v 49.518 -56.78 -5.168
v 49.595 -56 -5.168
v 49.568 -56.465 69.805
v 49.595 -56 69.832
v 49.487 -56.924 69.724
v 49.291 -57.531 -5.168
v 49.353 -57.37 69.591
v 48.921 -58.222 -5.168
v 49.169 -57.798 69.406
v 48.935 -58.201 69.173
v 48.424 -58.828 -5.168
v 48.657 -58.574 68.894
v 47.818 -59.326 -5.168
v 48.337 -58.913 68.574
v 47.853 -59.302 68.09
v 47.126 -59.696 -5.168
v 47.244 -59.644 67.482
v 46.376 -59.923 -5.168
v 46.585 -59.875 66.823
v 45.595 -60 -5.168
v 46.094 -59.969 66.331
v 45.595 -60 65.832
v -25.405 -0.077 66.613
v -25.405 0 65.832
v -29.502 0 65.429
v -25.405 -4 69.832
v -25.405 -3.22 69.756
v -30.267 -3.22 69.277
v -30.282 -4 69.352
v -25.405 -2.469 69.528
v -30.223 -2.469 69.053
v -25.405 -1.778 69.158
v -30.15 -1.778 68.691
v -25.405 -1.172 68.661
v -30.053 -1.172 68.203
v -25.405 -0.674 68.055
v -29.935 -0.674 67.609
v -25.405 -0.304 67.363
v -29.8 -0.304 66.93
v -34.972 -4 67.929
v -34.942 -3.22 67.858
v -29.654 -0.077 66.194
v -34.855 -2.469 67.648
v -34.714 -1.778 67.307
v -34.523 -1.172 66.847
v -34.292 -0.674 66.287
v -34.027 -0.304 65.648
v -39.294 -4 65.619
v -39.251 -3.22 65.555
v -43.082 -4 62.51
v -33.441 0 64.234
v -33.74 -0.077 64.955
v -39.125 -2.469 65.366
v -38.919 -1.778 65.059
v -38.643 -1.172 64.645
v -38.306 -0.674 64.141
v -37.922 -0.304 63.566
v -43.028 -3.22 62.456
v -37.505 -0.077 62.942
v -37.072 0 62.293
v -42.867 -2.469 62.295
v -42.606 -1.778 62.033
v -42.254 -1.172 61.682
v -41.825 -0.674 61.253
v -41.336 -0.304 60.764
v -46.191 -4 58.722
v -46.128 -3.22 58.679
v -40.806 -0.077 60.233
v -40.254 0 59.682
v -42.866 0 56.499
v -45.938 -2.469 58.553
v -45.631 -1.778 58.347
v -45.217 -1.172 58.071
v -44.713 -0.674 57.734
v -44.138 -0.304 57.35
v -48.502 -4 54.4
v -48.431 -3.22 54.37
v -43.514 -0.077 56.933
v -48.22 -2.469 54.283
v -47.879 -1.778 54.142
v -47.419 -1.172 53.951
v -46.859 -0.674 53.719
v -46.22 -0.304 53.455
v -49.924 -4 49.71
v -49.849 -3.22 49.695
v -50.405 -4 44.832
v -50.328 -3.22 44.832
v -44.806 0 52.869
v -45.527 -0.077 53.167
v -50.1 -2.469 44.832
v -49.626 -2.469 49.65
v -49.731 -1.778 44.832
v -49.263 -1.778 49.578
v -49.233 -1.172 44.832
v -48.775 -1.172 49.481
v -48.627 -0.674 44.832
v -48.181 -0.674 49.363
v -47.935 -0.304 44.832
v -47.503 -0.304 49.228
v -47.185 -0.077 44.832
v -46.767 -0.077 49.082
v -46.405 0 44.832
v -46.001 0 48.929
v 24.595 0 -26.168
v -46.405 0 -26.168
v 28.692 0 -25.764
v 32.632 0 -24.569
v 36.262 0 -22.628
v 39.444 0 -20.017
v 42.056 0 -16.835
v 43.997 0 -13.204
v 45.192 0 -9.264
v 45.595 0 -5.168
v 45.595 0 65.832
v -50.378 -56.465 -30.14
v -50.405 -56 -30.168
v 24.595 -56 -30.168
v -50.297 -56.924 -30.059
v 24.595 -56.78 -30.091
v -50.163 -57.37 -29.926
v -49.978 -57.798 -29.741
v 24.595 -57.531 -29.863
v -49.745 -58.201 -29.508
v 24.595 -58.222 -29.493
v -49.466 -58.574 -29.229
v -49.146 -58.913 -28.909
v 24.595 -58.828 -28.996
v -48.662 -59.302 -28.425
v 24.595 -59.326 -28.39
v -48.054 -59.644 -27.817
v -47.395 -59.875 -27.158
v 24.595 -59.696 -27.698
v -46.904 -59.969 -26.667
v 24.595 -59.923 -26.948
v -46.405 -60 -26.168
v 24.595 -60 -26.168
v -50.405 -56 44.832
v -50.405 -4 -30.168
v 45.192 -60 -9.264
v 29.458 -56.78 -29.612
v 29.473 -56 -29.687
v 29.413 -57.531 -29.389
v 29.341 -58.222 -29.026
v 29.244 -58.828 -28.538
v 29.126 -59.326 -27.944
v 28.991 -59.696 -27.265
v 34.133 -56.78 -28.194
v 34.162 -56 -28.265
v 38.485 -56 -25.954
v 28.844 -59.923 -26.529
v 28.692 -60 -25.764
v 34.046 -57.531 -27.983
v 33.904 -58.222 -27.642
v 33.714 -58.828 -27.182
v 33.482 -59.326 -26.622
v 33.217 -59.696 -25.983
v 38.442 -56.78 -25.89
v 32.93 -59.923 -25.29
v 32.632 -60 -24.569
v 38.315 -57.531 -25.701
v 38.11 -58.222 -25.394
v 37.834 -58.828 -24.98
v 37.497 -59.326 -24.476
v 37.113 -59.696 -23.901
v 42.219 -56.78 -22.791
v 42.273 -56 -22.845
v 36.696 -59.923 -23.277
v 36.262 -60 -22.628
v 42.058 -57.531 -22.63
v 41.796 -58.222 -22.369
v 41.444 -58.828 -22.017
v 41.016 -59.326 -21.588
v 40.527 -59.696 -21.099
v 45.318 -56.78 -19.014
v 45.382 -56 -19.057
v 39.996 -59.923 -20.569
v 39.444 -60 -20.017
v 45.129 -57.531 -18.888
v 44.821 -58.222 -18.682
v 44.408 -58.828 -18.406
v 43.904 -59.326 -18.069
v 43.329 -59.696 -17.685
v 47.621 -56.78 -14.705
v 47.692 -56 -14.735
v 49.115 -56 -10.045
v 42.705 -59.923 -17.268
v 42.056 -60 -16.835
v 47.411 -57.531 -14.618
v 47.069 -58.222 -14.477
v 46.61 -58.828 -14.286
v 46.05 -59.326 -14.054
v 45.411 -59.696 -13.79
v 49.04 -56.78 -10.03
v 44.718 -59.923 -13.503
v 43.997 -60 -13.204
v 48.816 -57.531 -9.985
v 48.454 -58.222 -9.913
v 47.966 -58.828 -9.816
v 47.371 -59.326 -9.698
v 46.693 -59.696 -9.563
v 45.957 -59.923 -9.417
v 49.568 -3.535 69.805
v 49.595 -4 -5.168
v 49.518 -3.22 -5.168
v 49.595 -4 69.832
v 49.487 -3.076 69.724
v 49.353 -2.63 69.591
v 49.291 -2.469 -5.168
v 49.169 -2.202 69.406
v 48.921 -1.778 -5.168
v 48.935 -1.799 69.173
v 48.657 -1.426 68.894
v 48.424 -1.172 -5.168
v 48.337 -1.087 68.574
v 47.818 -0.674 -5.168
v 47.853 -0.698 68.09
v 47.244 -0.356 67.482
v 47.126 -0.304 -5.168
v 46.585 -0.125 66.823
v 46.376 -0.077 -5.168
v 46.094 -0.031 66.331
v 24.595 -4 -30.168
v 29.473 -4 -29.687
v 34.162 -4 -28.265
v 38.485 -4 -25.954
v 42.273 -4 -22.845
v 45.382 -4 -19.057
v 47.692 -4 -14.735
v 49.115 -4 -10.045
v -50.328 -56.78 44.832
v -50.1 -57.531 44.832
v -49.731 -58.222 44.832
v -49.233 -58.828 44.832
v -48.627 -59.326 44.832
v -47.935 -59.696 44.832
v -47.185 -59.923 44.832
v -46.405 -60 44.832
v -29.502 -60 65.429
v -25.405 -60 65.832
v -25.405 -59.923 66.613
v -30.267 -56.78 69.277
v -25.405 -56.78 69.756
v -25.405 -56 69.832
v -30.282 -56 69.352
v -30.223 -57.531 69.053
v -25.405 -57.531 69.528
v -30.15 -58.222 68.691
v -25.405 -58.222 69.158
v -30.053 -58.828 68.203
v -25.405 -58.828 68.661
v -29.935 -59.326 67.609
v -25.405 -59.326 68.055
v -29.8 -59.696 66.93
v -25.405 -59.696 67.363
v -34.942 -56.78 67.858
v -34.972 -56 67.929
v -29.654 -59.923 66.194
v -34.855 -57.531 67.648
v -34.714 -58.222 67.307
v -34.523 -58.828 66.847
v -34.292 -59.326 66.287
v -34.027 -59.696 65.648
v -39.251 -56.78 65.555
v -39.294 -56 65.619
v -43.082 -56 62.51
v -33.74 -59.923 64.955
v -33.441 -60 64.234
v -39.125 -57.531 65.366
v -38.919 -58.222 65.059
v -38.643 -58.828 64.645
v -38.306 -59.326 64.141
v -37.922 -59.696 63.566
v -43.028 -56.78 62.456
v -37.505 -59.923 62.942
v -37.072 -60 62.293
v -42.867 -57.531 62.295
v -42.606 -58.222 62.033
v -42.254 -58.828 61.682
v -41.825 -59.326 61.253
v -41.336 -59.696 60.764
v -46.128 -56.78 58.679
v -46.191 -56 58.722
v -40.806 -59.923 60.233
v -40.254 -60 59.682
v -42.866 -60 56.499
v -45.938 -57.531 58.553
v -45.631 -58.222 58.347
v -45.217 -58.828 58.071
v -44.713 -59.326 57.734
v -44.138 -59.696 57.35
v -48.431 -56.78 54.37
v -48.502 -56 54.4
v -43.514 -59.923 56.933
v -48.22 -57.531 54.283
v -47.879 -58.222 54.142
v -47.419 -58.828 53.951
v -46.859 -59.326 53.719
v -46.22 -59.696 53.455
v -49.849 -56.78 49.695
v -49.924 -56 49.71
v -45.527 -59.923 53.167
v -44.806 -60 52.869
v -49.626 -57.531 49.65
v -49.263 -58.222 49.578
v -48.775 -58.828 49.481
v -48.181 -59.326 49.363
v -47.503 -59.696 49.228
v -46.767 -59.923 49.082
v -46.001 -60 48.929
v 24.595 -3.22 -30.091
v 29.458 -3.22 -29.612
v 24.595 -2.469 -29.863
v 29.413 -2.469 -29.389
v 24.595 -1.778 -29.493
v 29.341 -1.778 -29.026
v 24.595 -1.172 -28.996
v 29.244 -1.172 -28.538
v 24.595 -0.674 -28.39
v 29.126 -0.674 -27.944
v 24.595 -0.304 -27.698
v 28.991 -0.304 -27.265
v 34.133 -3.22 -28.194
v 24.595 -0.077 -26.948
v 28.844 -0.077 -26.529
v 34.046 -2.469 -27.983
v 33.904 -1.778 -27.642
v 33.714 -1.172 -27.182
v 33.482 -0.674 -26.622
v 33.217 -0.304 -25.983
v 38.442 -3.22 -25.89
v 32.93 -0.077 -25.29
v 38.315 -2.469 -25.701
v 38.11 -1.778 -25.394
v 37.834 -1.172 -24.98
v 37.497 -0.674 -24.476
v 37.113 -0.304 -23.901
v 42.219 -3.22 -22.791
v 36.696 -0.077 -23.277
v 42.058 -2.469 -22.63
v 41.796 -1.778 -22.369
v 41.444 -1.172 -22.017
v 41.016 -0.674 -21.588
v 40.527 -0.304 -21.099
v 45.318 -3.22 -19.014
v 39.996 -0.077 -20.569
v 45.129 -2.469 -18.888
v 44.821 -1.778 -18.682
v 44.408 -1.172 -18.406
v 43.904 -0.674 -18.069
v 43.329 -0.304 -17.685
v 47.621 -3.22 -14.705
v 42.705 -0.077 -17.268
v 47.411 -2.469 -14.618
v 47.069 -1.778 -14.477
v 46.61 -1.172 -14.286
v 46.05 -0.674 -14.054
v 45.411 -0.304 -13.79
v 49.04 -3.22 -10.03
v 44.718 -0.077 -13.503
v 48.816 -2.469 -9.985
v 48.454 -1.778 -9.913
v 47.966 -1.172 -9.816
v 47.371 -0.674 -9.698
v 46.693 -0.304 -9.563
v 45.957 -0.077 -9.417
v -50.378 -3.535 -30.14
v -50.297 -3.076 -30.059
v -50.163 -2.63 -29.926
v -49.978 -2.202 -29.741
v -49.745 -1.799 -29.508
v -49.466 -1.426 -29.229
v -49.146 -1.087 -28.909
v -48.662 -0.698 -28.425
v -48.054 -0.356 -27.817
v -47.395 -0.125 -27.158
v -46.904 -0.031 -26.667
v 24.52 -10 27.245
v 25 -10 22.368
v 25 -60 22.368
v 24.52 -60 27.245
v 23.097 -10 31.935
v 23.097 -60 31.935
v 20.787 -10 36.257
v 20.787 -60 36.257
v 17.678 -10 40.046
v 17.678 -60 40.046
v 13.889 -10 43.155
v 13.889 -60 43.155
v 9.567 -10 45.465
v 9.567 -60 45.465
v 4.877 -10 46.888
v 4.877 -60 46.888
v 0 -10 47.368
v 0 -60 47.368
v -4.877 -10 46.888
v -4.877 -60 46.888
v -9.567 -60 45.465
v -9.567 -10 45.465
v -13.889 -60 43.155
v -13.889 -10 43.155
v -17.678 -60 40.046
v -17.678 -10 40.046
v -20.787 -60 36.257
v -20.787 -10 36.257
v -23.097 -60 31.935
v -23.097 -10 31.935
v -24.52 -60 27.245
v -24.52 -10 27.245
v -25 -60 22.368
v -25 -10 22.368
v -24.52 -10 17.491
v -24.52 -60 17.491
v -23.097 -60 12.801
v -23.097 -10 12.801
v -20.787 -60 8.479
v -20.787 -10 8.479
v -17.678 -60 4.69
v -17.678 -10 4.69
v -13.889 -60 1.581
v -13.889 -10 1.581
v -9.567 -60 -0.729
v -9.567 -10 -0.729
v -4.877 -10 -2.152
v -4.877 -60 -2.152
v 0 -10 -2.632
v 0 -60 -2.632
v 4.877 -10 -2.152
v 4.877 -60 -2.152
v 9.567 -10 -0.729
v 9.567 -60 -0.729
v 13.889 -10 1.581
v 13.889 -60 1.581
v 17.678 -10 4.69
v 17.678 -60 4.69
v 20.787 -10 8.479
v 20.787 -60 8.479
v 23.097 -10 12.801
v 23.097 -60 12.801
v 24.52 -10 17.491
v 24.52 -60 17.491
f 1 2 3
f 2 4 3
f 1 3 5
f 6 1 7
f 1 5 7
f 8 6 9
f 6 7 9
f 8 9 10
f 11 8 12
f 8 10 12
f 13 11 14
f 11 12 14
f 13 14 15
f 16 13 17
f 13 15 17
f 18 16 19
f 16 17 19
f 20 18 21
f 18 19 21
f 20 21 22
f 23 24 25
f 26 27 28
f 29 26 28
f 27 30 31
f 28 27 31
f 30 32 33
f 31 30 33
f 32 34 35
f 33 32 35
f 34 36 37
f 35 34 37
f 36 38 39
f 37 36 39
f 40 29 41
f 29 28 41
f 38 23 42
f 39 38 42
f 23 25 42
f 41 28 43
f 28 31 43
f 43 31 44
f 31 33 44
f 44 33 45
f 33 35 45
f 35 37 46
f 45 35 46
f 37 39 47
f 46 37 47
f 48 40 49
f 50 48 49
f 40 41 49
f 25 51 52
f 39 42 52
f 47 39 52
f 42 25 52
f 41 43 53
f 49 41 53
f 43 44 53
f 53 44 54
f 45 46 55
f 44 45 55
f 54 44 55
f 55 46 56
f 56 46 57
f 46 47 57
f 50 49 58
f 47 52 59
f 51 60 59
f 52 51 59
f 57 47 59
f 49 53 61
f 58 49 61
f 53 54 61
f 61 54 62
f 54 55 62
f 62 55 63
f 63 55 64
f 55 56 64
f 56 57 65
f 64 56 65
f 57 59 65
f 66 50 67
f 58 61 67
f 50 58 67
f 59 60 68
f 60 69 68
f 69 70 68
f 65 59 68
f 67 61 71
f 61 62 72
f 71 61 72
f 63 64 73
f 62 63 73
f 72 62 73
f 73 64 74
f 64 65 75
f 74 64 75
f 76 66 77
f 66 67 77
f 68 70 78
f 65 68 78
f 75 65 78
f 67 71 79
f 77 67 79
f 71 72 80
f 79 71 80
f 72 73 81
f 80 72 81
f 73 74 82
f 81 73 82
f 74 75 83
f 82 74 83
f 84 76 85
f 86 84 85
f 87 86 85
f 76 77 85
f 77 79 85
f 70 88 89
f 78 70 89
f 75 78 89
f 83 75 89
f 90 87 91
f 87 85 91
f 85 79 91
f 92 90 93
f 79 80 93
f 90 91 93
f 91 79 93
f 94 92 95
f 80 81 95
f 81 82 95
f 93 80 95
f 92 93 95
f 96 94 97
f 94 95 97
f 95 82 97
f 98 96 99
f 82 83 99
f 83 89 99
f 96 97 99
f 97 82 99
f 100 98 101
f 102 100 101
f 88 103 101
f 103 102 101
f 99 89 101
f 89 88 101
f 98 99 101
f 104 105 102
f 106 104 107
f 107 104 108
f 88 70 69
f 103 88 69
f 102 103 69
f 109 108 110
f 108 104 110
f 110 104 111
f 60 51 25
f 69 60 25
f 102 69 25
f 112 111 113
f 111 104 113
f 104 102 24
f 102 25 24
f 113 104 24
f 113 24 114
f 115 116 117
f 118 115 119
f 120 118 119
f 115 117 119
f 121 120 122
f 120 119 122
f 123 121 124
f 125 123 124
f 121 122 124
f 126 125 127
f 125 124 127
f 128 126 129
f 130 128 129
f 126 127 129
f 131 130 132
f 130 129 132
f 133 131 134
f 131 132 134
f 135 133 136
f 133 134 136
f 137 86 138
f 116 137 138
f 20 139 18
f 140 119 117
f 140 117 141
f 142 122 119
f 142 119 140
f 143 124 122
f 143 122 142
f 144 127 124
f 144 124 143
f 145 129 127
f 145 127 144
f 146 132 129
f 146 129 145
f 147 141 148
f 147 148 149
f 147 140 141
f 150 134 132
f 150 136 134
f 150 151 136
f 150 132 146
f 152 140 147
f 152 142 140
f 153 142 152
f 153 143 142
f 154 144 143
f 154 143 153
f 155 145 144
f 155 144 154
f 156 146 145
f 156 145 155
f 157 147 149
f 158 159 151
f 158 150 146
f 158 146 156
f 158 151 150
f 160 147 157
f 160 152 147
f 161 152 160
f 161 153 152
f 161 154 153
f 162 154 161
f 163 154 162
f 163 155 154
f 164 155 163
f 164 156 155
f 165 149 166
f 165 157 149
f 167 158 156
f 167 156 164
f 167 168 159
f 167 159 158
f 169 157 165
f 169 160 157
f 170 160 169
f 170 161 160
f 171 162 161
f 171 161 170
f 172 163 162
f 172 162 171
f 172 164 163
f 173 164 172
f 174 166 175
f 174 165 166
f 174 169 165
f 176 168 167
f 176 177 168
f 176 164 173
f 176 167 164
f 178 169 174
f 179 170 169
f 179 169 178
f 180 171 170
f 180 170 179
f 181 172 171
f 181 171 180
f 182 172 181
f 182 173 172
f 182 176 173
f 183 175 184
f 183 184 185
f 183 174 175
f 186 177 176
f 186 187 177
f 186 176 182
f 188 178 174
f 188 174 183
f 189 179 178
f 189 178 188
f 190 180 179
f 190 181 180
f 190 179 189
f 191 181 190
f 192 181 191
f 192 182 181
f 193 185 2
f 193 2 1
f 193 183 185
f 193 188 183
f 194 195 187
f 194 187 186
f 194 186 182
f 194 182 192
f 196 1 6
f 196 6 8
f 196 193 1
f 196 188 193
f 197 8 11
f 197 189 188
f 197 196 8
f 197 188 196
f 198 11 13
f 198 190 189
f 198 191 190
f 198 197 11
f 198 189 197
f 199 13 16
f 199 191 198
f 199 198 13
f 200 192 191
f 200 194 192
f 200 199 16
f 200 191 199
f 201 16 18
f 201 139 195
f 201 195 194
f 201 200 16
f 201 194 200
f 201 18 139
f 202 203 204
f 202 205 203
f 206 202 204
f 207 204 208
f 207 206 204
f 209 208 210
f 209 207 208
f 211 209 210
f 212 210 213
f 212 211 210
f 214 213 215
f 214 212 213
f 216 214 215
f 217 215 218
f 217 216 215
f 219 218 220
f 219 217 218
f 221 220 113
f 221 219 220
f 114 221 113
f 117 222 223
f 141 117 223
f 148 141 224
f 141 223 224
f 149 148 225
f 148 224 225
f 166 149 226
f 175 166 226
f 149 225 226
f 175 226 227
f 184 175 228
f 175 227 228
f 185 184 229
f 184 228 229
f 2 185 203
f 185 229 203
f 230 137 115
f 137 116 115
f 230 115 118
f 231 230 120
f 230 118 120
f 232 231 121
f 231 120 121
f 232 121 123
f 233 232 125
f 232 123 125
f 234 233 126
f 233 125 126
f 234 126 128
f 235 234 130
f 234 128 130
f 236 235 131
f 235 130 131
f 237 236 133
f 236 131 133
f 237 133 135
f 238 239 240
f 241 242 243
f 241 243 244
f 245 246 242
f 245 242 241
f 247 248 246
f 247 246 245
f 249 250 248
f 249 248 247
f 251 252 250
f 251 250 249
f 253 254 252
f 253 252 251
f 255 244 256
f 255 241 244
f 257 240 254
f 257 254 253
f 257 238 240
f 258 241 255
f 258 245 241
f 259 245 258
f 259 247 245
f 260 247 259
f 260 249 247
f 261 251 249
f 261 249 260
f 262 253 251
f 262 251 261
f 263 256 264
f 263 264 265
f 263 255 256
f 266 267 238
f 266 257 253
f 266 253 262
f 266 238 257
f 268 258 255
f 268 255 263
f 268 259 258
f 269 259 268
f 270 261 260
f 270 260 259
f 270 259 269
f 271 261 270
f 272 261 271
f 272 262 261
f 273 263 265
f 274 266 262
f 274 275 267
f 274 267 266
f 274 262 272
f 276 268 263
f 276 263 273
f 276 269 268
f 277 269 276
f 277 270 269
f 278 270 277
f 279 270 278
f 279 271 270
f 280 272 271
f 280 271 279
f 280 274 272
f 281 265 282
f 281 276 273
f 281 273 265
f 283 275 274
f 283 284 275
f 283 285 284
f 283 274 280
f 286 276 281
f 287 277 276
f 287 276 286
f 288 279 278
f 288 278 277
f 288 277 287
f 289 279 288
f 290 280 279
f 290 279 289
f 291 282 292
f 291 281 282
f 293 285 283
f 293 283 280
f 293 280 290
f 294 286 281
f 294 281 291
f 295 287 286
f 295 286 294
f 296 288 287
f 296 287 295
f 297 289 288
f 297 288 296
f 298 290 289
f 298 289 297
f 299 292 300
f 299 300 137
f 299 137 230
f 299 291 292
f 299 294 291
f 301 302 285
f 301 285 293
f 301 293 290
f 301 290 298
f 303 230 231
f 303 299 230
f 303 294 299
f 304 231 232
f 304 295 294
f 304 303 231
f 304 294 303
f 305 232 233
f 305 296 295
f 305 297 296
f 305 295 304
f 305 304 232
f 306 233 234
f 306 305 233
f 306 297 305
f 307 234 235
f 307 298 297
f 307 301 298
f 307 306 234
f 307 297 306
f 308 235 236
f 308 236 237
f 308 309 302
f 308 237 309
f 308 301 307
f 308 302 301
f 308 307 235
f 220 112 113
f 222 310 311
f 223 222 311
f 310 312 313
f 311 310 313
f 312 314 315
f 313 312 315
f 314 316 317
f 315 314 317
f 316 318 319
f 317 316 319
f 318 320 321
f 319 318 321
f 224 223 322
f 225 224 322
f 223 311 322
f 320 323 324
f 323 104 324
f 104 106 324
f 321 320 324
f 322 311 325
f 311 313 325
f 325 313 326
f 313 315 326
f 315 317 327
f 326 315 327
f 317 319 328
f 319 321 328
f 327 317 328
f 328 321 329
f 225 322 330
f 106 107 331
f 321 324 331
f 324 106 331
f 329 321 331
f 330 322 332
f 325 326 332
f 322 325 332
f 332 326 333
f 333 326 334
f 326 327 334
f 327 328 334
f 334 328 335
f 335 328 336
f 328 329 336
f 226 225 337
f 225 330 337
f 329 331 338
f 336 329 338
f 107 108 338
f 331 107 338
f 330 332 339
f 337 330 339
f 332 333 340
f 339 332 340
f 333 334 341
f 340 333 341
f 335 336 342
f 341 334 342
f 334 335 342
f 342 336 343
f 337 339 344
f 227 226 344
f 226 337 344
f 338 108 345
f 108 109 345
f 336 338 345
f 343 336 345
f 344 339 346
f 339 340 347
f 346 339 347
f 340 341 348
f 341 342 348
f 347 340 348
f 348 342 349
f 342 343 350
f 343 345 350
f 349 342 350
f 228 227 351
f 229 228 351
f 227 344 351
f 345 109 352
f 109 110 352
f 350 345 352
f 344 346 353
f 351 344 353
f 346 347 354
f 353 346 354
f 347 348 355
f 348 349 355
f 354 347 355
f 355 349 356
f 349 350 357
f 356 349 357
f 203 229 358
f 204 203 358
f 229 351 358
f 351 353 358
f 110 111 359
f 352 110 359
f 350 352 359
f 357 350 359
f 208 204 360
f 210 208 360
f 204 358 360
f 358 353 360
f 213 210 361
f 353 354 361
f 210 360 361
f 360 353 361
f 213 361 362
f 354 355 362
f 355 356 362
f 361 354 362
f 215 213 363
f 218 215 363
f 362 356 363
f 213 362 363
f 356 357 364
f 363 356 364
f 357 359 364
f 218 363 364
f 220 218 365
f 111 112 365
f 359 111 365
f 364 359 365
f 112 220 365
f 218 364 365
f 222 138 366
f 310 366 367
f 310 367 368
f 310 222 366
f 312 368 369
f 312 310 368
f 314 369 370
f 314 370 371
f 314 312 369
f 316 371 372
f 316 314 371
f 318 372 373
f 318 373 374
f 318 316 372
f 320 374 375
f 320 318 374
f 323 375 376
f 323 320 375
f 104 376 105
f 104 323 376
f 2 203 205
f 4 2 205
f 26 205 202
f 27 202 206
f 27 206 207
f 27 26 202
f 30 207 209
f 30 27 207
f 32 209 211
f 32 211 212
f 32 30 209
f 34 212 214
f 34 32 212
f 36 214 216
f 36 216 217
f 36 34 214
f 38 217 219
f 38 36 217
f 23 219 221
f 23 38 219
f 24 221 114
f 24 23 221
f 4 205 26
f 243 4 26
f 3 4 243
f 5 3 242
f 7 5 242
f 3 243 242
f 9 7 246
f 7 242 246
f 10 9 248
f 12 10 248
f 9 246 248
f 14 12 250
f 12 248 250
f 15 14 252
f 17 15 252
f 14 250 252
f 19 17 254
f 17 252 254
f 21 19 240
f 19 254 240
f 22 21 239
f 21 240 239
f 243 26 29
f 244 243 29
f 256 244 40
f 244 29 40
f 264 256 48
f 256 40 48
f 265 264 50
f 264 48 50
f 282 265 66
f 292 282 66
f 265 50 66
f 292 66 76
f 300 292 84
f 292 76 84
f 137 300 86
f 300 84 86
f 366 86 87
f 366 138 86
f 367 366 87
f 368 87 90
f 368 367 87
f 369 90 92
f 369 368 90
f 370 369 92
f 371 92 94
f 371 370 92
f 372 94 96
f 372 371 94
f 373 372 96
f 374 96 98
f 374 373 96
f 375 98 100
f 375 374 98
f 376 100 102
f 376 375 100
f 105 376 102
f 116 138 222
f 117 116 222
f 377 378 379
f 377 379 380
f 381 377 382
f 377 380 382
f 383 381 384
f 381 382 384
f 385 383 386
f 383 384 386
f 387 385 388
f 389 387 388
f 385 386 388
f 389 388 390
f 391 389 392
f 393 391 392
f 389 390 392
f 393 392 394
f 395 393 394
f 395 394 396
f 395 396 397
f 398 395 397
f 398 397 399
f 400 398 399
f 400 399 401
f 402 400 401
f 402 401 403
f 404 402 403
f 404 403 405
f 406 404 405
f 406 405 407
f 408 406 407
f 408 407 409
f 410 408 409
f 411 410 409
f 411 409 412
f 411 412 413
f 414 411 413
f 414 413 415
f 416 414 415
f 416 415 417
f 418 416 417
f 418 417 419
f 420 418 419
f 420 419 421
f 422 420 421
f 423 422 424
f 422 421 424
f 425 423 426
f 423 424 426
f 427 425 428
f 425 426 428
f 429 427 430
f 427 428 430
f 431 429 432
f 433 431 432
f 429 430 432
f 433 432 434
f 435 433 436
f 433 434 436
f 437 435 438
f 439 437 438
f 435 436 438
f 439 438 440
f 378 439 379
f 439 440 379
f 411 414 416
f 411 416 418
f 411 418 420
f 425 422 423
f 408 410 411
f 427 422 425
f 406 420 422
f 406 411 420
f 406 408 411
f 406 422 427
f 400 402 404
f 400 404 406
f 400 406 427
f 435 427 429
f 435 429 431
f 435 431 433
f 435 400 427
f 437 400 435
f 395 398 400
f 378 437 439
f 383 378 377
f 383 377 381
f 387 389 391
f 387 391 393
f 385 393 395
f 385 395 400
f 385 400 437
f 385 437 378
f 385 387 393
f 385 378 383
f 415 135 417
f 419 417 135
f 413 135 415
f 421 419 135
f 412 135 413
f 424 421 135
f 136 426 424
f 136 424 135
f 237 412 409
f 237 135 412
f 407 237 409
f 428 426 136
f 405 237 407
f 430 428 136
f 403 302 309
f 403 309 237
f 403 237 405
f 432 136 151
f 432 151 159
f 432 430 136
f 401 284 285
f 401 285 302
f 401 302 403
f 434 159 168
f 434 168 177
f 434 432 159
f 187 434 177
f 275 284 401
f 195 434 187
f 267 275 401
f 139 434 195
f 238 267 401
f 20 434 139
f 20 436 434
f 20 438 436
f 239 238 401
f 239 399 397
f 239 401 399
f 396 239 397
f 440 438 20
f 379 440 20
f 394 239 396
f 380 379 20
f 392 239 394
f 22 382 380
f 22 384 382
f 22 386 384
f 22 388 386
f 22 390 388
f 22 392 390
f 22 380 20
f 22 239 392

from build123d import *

# Parameters (mm, degrees)
F1_DEPTH  = 60
F2_R      = 4
F3_R      = 4
F4_R      = 25
F5_DEPTH  = 25
F5_FACE_R = 25
F6_DEPTH  = 25


with BuildPart() as f1:
    # F0 (on Front) → F1 (new body)
    with BuildSketch(Plane.XZ):
        with BuildLine():
            Line((49.595254, 69.832447), (-25.404746, 69.832447))
            ThreePointArc((-25.404746, 69.832447), (-43.082416, 62.510116), (-50.404746, 44.832447))
            Line((-50.404746, 44.832447), (-50.404746, -30.167553))
            Line((-50.404746, -30.167553), (24.595254, -30.167553))
            ThreePointArc((24.595254, -30.167553), (42.272923, -22.845223), (49.595254, -5.167553))
            Line((49.595254, -5.167553), (49.595254, 69.832447))
        make_face()
    extrude(amount=F1_DEPTH)

    # F2
    f2_edges = [f1.edges().sort_by_distance(p)[0] for p in [
        (49.595254, -60, 32.332447),
        (12.095254, -60, 69.832447),
        (-43.082416, -60, 62.510116),
        (-50.404746, -60, 7.332447),
        (-12.904746, -60, -30.167553),
        (42.272923, -60, -22.845223),
    ]]
    fillet(f2_edges, radius=F2_R)

    # F3
    f3_edges = [f1.edges().sort_by_distance(p)[0] for p in [
        (49.595254, 0, 32.332447),
        (12.095254, 0, 69.832447),
        (-43.082416, 0, 62.510116),
        (-50.404746, 0, 7.332447),
        (-12.904746, 0, -30.167553),
        (42.272923, 0, -22.845223),
    ]]
    fillet(f3_edges, radius=F3_R)

    # F4 (on face) → F5 (cut)
    with BuildSketch(Plane.XZ.offset(60)):
        with Locations((0, 22.368037)):
            Circle(F4_R)
    extrude(amount=-F5_DEPTH, mode=Mode.SUBTRACT)

    # F5_face (on face) + F4 (on face) → F6 (cut)
    with BuildSketch(Plane(origin=(0, -35, 22.368037), x_dir=(1, 0, 0), z_dir=(0, -1, 0))):
        Circle(F5_FACE_R)
    with BuildSketch(Plane.XZ.offset(60)):
        with Locations((0, 22.368037)):
            Circle(F4_R)
    extrude(amount=-F6_DEPTH, mode=Mode.SUBTRACT)


solid = f1.part
